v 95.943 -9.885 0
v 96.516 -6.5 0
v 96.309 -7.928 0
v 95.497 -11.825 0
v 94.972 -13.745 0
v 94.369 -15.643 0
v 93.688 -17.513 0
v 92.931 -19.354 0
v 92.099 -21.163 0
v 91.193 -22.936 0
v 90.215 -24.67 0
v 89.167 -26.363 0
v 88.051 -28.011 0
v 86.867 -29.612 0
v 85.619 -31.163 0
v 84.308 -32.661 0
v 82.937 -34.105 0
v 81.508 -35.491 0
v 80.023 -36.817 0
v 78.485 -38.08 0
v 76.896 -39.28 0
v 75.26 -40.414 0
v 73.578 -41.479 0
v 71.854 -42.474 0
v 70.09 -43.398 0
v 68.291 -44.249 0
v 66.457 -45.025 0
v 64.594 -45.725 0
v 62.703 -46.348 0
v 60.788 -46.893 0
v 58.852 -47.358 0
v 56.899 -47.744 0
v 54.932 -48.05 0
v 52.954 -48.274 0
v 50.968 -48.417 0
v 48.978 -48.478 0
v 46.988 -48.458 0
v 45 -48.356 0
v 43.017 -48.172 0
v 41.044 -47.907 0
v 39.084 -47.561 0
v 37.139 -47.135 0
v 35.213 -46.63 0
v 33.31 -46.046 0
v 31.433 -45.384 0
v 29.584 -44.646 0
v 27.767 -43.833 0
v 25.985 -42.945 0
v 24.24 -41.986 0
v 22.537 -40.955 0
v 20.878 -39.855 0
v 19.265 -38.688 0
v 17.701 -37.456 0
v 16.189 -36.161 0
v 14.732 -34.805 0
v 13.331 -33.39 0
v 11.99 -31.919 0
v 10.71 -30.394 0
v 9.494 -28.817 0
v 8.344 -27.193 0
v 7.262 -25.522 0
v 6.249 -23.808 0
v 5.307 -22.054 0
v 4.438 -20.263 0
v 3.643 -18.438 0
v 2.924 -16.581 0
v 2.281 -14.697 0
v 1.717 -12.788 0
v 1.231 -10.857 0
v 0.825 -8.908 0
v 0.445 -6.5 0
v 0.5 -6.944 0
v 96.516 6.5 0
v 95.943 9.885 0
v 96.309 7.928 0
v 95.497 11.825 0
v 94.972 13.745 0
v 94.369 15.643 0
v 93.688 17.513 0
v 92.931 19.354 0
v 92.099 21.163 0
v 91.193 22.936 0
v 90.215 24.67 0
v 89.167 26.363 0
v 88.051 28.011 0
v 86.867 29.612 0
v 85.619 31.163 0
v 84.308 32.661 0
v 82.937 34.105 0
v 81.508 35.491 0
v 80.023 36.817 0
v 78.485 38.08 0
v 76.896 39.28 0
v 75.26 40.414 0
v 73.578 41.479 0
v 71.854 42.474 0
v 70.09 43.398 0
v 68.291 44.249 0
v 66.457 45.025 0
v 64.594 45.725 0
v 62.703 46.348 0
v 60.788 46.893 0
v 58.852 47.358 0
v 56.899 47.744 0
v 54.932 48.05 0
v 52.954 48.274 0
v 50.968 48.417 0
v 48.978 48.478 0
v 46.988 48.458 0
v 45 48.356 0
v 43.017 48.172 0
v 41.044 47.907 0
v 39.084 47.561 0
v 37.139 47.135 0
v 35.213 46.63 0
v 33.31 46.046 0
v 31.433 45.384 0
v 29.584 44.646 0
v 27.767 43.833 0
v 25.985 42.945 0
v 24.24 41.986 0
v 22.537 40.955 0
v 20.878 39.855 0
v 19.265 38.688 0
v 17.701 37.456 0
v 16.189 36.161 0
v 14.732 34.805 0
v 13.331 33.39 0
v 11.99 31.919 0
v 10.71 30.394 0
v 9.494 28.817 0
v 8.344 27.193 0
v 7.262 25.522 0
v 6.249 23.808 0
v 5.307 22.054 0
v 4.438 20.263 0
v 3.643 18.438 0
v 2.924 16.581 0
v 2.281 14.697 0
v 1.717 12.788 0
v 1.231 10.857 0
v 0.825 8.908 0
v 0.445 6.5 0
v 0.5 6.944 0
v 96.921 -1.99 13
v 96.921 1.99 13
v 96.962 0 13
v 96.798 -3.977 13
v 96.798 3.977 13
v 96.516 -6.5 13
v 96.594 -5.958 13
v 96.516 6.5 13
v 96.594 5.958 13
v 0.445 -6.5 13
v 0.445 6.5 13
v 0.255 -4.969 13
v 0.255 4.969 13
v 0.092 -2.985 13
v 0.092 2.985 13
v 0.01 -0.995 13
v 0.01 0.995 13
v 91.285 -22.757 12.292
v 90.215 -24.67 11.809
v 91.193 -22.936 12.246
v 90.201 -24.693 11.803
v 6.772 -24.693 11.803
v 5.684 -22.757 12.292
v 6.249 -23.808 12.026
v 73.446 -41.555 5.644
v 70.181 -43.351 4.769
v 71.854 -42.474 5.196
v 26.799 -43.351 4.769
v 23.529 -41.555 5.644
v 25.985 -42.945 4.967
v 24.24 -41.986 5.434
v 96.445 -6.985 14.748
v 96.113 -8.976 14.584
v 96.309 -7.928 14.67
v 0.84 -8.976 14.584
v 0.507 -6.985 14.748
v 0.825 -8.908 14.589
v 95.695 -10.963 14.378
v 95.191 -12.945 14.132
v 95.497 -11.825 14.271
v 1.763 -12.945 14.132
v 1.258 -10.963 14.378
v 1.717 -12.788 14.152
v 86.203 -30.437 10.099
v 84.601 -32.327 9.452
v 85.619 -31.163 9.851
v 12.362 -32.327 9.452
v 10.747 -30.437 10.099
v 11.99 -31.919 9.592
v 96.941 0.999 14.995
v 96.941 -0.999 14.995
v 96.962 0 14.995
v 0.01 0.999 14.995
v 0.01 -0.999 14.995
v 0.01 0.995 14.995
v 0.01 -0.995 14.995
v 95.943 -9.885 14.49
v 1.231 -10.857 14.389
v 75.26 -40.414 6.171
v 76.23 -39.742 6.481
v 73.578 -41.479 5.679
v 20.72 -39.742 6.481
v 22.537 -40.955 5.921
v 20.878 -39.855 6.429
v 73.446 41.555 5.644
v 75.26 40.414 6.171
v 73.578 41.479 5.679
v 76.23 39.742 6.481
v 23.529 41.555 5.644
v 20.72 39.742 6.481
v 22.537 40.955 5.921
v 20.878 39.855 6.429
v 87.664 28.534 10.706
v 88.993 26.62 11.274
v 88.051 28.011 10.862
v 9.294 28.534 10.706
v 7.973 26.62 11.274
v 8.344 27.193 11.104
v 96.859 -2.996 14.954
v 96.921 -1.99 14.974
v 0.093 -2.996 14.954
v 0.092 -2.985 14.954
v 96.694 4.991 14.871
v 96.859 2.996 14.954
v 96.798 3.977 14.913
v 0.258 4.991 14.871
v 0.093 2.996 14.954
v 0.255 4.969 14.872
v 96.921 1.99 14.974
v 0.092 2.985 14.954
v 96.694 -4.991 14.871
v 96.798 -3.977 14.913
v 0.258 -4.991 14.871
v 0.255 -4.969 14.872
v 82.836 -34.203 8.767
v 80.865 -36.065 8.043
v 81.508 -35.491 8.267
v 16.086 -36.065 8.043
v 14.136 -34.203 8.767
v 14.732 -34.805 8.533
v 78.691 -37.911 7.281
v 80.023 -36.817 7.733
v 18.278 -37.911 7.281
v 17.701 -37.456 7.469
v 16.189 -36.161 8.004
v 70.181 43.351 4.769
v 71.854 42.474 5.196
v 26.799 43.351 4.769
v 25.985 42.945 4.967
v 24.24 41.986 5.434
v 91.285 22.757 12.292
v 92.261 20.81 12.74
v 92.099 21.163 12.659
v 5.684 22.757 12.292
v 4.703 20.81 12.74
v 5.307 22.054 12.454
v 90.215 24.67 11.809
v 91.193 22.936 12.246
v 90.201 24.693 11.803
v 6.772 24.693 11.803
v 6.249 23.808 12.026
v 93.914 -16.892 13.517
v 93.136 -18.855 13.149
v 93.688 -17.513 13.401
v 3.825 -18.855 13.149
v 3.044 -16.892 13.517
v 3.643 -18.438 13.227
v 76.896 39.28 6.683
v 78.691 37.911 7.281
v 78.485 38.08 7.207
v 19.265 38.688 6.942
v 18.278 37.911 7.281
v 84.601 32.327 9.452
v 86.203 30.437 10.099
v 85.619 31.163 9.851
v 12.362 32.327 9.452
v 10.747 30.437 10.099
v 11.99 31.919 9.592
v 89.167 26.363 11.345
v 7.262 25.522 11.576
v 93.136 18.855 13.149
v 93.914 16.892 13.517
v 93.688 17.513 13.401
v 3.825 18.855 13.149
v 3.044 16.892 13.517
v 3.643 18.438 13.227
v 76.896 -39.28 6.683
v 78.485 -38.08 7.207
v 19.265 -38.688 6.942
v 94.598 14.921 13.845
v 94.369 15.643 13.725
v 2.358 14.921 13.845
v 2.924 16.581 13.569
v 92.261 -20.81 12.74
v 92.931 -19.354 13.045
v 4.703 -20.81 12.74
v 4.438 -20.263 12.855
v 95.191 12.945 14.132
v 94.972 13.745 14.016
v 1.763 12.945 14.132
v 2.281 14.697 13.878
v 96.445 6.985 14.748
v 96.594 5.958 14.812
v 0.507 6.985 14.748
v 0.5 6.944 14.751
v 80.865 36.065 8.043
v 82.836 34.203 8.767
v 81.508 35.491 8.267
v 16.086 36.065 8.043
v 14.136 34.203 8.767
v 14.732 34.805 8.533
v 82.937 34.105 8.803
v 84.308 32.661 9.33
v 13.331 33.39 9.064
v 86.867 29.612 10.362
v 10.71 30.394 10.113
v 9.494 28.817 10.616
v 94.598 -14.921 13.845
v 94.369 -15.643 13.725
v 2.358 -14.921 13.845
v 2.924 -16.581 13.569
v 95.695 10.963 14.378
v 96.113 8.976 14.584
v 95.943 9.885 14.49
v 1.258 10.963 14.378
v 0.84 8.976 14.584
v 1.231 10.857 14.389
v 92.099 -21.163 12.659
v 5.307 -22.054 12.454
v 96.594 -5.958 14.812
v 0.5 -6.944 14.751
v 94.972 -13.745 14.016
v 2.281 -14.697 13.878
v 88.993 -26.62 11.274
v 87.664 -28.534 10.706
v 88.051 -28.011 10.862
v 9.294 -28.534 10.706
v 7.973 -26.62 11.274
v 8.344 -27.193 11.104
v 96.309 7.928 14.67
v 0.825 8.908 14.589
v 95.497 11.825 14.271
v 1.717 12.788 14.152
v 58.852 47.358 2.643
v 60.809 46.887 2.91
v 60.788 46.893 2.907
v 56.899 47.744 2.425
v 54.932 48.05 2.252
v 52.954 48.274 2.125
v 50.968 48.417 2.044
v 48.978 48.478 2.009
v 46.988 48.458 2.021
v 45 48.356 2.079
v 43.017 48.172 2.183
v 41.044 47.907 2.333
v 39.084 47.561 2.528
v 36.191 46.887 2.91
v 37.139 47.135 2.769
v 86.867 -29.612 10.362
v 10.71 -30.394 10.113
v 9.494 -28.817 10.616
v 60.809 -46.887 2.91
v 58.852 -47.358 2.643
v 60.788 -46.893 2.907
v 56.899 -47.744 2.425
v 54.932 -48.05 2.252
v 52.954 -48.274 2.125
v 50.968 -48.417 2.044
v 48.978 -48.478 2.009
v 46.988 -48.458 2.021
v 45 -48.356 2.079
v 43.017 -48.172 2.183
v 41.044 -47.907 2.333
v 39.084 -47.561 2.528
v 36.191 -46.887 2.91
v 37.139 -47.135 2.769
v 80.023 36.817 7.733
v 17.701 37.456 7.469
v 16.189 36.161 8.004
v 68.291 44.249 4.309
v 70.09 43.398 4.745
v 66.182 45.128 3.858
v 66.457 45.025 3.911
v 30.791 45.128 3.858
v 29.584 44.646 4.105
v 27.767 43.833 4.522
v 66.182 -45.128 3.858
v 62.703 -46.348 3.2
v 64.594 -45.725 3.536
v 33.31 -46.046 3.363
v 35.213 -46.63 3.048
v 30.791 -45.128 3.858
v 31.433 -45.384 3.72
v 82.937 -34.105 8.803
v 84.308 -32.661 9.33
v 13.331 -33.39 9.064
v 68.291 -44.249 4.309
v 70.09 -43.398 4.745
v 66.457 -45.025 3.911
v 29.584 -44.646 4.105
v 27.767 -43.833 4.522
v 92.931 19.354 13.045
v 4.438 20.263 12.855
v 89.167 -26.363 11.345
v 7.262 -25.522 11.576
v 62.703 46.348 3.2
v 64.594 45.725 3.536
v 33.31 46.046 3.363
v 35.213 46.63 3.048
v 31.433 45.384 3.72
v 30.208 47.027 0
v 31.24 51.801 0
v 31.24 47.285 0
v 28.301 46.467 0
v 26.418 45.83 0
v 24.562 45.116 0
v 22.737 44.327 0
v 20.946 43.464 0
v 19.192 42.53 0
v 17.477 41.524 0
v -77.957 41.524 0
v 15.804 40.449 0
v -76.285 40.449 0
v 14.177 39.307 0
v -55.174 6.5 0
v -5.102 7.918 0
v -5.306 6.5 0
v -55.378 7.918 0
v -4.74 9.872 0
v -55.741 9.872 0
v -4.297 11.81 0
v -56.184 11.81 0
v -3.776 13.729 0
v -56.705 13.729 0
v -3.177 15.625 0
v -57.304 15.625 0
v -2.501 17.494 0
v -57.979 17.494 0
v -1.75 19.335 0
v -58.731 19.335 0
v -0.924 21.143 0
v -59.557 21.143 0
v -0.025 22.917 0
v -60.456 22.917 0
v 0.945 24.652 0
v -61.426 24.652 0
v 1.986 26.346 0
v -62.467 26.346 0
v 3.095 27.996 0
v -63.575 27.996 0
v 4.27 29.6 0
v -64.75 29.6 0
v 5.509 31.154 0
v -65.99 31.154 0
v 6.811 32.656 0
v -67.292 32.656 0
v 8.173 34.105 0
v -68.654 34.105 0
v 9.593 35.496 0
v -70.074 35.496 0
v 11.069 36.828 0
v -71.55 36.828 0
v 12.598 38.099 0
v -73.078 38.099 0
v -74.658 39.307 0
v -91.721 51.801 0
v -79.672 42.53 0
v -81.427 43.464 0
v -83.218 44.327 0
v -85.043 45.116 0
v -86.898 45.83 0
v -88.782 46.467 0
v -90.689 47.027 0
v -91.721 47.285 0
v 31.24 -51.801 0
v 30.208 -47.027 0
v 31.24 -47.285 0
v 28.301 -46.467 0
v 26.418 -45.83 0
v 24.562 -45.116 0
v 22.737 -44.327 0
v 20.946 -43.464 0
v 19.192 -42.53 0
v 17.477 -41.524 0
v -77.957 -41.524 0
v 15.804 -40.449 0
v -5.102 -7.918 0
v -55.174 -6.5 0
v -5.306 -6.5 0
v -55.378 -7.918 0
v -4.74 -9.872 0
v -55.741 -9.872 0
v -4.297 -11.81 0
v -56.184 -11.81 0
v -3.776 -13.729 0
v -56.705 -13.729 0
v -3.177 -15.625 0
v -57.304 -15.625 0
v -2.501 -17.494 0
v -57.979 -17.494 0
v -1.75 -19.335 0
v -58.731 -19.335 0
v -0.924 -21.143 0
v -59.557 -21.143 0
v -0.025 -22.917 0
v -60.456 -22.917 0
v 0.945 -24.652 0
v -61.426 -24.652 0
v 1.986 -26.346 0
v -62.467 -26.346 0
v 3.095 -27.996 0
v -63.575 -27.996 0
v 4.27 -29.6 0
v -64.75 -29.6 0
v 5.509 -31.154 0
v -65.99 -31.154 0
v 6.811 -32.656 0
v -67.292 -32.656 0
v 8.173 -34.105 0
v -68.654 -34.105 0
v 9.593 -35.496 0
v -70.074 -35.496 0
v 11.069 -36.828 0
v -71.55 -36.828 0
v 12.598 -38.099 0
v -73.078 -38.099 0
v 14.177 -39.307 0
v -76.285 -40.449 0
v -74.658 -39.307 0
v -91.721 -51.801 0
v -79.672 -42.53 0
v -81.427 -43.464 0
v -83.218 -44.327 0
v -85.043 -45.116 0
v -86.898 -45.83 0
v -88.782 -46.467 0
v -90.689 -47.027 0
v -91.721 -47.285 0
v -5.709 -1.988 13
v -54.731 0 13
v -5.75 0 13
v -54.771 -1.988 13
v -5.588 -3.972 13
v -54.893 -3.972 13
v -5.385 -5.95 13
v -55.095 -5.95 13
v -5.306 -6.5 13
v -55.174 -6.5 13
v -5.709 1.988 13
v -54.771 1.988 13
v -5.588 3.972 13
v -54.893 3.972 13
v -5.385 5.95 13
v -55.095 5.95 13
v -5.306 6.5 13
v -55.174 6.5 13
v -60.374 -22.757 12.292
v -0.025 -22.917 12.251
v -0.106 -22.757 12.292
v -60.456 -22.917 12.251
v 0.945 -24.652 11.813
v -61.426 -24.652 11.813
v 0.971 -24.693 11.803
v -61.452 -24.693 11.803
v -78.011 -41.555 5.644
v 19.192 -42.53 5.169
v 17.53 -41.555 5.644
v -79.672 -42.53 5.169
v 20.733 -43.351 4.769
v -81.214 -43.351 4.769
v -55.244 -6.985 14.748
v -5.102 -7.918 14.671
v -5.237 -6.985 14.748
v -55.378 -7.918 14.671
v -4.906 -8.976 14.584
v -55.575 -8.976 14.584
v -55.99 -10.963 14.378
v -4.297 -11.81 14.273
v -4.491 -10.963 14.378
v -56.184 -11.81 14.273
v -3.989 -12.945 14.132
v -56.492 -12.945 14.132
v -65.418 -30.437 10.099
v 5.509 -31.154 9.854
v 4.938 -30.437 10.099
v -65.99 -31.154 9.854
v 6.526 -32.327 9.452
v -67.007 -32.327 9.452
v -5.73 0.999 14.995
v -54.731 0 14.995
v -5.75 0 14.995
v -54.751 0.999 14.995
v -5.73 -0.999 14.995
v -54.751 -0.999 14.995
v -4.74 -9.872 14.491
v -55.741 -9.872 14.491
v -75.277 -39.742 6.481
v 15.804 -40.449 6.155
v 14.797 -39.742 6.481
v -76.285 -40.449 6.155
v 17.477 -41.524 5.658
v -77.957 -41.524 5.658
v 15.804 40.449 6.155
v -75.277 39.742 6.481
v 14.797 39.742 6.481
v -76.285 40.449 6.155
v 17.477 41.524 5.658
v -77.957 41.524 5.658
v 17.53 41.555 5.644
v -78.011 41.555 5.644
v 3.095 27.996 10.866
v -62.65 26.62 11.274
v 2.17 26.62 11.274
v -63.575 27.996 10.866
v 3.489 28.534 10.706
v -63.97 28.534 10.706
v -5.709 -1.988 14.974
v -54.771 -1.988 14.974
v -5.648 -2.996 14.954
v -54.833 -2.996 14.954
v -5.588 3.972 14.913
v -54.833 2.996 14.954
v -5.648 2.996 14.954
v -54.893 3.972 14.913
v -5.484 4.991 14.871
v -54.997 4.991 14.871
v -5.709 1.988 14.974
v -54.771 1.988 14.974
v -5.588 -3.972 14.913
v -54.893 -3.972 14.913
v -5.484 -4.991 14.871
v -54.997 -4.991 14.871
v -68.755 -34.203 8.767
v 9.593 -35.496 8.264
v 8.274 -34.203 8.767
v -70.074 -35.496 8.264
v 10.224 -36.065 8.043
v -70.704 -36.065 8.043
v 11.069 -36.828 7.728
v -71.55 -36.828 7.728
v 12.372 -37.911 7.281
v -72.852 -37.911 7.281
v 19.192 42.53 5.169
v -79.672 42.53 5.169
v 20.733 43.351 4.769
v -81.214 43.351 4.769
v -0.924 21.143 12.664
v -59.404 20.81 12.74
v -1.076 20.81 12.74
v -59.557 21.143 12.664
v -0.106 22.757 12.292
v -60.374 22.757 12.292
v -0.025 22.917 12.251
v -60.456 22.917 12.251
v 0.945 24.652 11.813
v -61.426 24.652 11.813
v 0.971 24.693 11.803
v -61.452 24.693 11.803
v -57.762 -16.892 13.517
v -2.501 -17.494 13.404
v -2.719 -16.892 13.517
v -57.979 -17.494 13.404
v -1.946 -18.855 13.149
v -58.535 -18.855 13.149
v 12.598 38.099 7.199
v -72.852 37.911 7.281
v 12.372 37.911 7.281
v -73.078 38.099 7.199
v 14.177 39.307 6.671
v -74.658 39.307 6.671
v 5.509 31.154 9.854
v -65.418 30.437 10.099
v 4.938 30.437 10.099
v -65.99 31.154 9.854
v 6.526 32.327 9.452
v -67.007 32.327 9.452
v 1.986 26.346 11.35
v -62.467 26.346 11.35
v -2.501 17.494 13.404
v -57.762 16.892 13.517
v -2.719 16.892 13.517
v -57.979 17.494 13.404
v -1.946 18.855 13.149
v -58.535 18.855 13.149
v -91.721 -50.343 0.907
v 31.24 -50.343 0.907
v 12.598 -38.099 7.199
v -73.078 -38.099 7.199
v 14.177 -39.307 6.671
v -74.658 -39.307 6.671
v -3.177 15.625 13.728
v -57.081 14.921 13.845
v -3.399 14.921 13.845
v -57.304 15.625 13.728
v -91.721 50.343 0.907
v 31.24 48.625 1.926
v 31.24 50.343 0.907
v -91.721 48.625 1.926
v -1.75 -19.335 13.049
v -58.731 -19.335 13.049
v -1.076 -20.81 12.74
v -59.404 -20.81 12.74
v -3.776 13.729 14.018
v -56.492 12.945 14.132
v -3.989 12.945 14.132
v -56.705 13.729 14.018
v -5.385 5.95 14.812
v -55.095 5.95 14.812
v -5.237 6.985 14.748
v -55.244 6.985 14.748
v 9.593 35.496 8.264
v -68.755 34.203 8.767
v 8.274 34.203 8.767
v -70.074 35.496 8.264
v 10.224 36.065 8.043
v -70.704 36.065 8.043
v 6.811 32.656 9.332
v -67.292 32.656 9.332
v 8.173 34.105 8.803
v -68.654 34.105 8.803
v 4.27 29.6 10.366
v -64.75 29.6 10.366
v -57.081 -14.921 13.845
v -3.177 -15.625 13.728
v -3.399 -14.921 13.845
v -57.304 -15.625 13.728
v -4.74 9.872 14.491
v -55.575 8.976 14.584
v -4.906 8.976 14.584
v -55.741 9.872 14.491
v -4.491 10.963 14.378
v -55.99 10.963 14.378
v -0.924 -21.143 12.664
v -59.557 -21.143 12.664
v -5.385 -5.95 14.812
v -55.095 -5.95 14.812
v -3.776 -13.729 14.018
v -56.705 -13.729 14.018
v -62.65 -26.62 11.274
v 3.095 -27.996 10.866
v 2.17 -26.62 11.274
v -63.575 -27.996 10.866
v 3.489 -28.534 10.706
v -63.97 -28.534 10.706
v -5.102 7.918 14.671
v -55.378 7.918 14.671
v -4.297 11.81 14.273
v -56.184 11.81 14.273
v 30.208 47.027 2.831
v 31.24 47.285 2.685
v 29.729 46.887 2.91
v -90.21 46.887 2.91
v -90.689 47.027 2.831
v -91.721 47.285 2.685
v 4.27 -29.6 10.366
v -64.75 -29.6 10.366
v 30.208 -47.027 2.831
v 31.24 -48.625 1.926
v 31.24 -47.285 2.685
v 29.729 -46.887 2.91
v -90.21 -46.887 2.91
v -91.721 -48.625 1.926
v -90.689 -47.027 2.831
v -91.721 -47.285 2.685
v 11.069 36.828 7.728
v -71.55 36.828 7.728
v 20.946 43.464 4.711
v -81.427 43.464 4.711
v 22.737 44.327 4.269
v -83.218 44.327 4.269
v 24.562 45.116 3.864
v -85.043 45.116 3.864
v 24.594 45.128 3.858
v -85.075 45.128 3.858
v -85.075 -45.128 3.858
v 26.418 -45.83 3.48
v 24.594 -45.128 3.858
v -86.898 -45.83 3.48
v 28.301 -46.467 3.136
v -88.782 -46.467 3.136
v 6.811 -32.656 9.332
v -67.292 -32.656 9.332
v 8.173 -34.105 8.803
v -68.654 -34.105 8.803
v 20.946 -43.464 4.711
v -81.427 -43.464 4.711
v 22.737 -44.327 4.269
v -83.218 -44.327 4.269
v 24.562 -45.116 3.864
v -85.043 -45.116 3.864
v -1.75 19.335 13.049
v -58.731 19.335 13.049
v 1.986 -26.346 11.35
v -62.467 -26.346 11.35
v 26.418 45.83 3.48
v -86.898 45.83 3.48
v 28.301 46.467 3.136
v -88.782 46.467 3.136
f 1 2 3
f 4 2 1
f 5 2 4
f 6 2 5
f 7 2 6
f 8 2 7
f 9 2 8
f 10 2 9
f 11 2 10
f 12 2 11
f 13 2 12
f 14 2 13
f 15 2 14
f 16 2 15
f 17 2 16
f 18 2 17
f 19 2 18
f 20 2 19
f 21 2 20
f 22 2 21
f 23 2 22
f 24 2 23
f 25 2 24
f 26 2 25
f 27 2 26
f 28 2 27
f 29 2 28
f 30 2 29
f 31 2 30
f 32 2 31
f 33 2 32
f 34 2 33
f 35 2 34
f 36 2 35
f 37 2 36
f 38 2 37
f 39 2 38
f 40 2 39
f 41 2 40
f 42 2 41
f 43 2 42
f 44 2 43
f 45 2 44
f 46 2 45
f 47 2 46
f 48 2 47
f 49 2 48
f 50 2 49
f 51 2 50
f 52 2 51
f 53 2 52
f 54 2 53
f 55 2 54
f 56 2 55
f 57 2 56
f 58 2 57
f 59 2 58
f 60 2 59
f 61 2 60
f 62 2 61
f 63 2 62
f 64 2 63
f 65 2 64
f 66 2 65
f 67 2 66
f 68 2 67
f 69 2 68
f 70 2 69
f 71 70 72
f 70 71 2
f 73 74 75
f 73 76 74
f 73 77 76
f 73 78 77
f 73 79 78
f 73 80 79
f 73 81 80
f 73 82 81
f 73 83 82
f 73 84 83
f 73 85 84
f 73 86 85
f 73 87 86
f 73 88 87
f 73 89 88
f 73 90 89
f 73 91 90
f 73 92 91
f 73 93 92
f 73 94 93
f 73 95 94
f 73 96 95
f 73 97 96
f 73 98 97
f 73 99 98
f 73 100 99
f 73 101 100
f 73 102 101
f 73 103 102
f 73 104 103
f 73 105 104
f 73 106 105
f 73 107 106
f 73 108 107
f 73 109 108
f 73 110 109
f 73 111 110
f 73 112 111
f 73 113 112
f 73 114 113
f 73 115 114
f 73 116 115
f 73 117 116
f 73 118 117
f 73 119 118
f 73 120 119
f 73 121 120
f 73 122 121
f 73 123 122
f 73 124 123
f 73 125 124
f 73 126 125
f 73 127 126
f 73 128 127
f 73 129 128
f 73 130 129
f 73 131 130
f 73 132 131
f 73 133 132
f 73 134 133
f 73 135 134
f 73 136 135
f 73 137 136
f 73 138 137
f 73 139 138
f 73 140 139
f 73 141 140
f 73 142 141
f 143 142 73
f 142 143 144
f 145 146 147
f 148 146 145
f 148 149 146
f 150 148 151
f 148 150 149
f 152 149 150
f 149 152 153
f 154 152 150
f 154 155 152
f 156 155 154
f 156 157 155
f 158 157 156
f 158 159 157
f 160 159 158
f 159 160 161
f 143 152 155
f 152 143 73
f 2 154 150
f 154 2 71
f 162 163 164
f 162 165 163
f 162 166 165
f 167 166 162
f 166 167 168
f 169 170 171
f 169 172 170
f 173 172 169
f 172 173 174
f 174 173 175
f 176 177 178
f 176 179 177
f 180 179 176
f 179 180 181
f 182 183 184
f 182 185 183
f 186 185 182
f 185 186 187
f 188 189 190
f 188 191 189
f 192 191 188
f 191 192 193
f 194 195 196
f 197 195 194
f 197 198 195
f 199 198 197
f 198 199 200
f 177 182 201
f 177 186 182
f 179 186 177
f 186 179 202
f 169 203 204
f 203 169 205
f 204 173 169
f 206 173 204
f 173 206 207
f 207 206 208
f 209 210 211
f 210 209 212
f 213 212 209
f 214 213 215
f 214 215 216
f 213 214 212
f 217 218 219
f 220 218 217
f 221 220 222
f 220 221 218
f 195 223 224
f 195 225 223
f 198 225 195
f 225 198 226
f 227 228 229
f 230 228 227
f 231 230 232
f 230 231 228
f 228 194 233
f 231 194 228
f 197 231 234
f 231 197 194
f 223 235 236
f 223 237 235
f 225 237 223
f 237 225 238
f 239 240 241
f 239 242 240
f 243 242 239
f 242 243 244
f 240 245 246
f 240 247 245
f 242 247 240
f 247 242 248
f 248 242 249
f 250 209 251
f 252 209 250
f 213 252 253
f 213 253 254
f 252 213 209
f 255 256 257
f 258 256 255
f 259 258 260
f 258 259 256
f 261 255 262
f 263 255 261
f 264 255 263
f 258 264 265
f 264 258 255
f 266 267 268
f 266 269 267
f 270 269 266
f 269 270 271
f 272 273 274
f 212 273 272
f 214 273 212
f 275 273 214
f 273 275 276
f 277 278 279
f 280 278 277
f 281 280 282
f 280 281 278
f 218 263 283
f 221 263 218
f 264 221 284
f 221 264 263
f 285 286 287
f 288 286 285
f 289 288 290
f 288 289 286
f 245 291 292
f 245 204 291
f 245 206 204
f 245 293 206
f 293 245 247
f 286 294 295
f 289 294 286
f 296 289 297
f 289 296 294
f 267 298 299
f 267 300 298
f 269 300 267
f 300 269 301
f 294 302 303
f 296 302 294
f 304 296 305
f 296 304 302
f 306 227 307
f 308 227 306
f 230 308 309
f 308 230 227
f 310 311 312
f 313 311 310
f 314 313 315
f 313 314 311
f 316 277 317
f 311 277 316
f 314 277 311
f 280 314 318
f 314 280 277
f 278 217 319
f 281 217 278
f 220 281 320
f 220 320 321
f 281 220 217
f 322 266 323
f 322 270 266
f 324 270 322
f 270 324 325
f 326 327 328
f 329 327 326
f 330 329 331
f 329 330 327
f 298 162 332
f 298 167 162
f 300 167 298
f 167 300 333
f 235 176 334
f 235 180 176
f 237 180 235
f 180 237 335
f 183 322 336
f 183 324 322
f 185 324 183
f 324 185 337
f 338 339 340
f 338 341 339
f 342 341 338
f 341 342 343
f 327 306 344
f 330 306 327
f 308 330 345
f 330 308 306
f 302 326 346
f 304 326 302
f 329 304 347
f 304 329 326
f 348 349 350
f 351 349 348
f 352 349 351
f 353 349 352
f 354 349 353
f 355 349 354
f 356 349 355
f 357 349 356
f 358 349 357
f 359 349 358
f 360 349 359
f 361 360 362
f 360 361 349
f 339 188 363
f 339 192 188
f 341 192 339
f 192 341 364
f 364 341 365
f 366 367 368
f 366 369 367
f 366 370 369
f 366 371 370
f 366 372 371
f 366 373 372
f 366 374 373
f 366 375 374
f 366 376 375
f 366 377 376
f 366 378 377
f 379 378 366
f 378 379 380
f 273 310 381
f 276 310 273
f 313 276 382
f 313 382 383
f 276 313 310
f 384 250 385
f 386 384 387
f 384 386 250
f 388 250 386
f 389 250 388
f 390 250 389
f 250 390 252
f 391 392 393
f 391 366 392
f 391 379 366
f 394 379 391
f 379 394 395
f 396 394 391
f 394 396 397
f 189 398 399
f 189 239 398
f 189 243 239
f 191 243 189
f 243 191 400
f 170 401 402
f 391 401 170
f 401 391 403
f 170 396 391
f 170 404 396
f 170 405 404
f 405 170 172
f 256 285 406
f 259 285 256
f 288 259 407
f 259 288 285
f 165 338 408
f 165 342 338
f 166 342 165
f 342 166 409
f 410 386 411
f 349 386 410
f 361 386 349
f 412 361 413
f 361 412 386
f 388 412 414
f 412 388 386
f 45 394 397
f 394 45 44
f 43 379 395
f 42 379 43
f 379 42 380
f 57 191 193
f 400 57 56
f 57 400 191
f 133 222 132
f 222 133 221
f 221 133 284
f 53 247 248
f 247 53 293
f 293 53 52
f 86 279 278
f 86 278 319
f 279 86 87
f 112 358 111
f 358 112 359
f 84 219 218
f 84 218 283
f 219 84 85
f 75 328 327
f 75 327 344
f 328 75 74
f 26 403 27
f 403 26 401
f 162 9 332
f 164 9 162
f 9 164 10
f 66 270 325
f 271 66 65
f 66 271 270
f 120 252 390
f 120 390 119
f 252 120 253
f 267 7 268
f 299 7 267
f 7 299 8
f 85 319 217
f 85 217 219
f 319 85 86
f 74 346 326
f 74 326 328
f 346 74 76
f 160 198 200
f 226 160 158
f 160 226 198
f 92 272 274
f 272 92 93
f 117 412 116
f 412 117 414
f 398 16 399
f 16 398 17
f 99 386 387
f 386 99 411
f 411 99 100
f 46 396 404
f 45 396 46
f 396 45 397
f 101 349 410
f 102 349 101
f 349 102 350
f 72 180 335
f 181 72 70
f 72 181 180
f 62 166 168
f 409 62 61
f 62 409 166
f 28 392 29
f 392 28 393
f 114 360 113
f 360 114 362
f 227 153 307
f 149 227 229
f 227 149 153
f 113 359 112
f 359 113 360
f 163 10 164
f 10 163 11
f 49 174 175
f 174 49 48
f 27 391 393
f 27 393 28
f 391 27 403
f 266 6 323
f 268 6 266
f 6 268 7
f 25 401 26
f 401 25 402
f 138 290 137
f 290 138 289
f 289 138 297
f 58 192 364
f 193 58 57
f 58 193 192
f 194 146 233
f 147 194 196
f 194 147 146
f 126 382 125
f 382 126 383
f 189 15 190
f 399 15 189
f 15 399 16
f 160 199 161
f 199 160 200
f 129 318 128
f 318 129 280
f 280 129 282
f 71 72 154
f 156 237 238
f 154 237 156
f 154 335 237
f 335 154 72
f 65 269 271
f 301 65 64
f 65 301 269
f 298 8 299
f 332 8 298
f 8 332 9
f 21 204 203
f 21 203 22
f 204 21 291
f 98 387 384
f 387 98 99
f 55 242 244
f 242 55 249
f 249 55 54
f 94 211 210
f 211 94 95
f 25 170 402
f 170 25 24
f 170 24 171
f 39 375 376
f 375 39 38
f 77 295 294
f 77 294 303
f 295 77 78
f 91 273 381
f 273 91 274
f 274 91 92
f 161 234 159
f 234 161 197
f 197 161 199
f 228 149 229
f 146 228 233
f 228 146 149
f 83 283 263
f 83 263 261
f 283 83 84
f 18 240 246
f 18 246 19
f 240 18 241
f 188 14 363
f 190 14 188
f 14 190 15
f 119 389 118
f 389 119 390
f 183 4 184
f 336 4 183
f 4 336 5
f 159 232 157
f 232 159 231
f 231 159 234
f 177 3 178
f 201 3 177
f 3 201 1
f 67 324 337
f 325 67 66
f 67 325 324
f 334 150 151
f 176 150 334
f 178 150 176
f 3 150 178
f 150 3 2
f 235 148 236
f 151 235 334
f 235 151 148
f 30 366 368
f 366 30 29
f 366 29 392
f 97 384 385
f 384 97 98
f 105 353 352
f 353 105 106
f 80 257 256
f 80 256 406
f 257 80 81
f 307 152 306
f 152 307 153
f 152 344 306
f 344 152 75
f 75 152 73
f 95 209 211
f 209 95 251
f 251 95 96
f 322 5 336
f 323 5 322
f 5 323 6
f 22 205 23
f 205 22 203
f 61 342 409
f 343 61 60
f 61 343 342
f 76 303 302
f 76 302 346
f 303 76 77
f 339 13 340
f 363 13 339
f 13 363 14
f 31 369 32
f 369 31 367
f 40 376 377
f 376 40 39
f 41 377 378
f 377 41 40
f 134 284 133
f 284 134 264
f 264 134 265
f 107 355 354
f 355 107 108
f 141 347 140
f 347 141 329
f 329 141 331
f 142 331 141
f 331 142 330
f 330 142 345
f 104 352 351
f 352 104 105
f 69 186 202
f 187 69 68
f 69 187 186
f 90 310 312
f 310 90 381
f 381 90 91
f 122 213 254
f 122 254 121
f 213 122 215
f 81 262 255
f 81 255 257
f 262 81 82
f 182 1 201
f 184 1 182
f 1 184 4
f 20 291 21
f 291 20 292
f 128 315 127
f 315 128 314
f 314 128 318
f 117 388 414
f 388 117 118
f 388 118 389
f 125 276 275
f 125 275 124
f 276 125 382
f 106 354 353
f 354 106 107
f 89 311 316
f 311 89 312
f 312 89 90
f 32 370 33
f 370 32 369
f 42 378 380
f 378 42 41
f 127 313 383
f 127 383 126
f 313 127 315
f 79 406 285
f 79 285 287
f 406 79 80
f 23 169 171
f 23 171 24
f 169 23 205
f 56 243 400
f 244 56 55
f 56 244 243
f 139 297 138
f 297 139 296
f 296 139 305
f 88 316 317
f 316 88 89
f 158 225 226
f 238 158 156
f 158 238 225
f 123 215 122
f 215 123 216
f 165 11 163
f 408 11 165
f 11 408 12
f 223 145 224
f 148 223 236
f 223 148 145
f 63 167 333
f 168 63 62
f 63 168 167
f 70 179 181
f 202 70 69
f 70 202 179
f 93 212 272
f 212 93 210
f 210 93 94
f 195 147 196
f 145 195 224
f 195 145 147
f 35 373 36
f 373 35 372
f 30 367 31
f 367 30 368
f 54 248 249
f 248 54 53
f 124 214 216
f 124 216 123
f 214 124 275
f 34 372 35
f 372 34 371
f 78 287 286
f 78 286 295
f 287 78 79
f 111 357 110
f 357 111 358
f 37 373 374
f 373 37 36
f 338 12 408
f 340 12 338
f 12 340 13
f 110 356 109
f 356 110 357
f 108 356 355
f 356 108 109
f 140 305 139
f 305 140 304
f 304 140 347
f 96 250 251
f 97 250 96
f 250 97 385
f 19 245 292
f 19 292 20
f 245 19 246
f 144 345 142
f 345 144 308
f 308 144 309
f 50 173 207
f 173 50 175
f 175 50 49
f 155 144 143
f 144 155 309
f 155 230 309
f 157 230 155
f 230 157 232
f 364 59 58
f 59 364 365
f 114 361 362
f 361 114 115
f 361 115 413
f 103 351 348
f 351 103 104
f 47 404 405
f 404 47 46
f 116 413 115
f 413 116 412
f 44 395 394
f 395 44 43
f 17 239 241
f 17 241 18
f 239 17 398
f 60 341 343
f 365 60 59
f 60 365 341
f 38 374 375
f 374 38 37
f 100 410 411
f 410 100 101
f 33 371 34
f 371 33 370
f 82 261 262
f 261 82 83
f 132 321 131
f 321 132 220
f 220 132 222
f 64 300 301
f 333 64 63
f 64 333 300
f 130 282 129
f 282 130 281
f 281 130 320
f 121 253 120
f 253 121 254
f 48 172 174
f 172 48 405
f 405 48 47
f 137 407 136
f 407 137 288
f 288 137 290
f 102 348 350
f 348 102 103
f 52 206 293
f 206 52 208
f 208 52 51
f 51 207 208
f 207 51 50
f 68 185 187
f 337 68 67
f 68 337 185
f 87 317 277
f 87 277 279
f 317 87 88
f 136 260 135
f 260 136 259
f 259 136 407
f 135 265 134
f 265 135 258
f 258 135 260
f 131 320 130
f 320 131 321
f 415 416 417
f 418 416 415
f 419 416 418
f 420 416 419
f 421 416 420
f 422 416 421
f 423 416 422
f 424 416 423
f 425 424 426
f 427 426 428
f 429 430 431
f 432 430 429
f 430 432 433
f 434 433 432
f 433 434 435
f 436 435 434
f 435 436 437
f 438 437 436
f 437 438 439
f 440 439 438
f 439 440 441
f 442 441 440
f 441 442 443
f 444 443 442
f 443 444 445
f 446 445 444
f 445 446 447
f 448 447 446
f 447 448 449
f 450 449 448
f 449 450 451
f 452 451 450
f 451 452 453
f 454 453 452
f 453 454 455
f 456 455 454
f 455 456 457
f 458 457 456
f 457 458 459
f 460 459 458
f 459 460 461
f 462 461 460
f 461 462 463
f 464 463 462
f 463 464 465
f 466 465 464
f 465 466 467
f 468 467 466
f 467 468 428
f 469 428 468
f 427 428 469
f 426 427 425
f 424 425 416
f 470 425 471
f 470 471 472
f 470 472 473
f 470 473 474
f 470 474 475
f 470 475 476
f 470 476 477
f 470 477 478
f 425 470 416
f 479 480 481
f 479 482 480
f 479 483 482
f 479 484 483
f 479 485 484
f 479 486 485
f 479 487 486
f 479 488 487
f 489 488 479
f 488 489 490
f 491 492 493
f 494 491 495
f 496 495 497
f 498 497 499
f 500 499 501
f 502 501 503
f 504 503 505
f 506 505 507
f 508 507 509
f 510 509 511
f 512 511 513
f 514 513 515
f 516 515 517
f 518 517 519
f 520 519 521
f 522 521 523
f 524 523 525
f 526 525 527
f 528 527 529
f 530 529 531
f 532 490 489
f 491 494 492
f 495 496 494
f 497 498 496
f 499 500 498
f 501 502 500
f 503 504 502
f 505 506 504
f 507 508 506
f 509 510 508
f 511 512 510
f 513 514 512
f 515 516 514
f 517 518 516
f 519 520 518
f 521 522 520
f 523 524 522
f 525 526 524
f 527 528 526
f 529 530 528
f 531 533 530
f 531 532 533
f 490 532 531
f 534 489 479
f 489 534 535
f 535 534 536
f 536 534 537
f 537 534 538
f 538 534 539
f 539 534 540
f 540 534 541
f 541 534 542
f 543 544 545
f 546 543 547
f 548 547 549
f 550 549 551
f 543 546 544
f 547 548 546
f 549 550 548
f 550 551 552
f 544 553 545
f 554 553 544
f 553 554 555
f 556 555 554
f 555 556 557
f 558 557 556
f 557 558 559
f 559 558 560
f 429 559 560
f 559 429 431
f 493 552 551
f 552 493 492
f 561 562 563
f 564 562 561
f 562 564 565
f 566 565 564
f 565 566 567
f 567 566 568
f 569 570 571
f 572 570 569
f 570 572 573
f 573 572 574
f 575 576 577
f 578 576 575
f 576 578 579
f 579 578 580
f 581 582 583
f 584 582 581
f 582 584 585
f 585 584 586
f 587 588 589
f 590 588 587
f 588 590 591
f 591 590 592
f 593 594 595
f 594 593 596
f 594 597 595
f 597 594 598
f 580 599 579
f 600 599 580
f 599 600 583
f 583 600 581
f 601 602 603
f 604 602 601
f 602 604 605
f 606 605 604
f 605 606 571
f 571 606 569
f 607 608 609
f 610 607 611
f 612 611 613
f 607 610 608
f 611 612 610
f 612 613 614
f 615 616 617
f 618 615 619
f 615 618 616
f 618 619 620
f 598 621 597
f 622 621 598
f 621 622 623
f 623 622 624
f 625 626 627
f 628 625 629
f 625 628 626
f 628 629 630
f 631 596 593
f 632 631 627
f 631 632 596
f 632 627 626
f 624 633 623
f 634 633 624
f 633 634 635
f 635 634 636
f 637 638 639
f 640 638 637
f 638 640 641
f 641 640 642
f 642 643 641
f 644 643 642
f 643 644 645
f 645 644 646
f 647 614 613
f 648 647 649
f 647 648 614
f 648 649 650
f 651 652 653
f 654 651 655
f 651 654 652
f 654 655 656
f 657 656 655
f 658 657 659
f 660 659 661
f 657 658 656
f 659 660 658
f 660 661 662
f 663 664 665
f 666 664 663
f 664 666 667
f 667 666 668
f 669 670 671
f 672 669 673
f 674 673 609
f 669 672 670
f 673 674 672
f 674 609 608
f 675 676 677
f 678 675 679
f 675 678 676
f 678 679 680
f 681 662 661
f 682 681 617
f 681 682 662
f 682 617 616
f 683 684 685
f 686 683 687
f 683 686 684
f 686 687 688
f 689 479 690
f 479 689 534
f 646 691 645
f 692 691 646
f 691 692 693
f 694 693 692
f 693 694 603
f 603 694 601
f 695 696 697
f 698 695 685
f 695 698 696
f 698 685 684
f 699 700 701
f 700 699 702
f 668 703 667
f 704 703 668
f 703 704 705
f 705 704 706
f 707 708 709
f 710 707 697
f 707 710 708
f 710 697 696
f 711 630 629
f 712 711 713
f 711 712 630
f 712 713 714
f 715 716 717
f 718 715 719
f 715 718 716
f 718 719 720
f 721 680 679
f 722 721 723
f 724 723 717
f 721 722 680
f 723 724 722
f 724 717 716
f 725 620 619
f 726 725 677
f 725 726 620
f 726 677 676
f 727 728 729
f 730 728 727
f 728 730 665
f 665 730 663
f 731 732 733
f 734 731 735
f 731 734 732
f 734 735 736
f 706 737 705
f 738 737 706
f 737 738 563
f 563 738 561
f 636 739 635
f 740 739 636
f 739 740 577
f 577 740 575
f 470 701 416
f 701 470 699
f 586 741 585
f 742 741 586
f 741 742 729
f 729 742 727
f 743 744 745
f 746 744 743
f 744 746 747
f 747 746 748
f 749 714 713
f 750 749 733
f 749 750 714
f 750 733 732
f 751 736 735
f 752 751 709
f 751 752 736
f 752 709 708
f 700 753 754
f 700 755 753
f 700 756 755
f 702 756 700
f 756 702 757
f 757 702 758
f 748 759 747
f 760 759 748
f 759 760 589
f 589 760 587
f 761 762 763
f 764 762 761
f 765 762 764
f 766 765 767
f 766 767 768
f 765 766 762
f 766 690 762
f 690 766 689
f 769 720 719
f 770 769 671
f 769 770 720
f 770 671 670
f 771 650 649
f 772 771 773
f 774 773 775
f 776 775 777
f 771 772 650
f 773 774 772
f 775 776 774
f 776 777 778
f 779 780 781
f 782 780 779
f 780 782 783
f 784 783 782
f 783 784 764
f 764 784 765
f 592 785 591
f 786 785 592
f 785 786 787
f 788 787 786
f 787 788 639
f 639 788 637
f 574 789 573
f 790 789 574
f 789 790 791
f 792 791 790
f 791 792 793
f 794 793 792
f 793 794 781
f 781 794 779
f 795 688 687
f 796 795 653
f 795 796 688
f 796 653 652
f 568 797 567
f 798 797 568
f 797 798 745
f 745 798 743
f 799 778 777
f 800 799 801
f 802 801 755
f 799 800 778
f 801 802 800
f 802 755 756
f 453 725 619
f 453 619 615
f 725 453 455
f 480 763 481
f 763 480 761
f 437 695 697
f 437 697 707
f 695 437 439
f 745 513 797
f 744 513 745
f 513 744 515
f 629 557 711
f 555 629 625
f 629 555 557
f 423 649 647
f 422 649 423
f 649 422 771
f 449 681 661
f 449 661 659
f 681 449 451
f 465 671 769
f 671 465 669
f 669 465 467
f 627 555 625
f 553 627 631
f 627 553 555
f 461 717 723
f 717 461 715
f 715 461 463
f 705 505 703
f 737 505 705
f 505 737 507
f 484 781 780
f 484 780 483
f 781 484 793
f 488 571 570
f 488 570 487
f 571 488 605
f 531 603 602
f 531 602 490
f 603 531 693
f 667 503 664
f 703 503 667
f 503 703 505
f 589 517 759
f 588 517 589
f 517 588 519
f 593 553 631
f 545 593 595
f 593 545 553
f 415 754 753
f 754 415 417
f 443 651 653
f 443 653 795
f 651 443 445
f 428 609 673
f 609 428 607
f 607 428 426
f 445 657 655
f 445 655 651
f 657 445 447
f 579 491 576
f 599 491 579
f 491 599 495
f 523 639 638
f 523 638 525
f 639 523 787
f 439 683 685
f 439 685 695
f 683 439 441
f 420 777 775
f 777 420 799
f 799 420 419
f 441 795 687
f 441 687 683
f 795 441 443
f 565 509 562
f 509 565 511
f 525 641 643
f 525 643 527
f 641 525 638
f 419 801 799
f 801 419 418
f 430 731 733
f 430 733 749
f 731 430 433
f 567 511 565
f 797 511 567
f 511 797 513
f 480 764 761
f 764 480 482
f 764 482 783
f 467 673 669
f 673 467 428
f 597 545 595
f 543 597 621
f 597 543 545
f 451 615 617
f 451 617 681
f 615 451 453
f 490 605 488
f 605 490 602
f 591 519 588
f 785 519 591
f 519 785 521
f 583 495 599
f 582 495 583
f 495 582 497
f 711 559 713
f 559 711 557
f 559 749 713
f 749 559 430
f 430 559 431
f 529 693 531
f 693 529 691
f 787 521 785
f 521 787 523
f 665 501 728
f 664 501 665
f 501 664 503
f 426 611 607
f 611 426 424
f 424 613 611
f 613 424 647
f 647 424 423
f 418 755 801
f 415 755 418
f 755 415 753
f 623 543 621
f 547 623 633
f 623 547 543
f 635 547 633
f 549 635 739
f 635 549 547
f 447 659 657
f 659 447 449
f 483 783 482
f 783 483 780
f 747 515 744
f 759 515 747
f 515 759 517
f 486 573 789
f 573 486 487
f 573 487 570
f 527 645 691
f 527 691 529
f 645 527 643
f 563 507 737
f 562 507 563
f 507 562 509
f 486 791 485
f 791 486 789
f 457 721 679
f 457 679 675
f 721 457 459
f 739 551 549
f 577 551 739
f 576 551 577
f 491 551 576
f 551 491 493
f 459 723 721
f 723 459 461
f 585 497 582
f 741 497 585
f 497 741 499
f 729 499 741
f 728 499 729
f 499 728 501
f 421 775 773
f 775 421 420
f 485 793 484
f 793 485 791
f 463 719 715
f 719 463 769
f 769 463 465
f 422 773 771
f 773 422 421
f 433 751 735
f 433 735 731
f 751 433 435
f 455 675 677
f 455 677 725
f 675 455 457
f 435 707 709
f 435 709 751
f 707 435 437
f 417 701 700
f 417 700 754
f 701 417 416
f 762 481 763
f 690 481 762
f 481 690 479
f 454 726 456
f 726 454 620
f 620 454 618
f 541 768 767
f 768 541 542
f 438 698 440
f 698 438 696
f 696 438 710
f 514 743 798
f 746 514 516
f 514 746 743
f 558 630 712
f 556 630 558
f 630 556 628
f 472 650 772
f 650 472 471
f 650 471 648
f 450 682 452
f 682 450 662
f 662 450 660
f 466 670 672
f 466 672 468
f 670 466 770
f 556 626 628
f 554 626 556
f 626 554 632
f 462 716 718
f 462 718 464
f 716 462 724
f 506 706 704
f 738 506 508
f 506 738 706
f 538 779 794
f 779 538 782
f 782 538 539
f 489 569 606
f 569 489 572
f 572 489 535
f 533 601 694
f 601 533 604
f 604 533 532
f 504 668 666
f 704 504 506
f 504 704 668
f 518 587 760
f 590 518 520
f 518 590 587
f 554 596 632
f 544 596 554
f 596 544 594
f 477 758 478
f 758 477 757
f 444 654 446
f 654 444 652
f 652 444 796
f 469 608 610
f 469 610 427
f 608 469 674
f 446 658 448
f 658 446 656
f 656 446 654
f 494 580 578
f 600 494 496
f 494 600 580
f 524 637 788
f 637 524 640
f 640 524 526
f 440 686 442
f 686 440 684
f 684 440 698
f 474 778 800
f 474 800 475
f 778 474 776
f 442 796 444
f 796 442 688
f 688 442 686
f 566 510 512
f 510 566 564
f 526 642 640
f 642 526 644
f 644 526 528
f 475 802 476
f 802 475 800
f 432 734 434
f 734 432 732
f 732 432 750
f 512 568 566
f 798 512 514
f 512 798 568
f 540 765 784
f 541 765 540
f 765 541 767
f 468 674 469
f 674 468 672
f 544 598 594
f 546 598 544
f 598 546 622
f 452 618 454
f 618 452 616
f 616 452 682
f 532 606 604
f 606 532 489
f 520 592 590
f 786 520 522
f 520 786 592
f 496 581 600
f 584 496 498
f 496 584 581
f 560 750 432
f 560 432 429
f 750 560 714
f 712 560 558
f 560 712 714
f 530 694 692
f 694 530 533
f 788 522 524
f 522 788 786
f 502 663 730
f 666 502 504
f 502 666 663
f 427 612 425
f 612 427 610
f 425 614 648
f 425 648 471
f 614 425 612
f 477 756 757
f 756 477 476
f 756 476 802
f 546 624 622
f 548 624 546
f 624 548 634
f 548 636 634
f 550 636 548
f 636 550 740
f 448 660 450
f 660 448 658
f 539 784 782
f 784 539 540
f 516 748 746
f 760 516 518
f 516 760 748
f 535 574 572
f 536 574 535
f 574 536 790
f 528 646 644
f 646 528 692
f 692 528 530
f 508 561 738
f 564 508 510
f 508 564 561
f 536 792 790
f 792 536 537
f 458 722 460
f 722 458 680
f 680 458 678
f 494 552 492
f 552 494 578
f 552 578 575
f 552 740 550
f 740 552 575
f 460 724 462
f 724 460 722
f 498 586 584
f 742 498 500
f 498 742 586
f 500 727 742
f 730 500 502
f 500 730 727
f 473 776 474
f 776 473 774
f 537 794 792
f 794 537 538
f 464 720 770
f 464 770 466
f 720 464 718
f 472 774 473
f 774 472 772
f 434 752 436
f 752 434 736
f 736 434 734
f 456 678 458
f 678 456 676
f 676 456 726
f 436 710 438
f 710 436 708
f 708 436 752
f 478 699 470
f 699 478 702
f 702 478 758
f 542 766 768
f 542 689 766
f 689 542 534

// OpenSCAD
// "Linkable" Floor Cable Protector
// variables for channel height and width.
// ADA compliance requires steepest approach to be 12 deg.  This determines width.

// Angle of attack, ADA requires steepest approach to be 12 degrees.  Also determines width.
AA=30; //[10,12,15,20,25,30]
// Height of channel, helps determine external height and width of chain
channel_height= 13; // [1:50]
// Width of channel, use narrower than a maximum (as determined by channel_height)
channel_width= 13; // [1:50]
// Thickness of bridge
bridge=2; //[1:5]
// Tolerance for mating parts
tolx=0.25; // [0:0.1:3]
// Which parts to print?
part = "both"; // [first:disk,second:linker,both:both]

print_part();

module print_part() {
	if (part == "first") {
		circle();
	} else if (part == "second") {
		link();
	} else if (part == "both") {
		both();
	} else {
		both();
	}
}

$fa=1;

// Perform cylinder calculations
cyl_rad=((channel_height+bridge)*cos(AA))/(1-cos(AA));
overlook=cyl_rad*sin(AA);

module track(){
    difference(){
        translate([0,0,-(cyl_rad-channel_height-bridge)])rotate([0,90,0])cylinder(h=overlook*2,r=cyl_rad);
        union(){
            translate([-tolx,-cyl_rad,-2*cyl_rad])cube([2*overlook+2*tolx,2*cyl_rad+tolx,2*cyl_rad]);
            translate([-tolx,-channel_width/2,-tolx])cube([2*overlook+2*tolx,channel_width,channel_height+tolx]);
        }
    }
}

module circle(){
    intersection(){
        track();
        translate([overlook,0,-tolx])cylinder(h=overlook,r=overlook);
   }
}

module cup(){
    difference(){
        track();
        union(){
            translate([1.5*overlook+2*tolx,0,-tolx])cylinder(h=overlook,r=overlook+tolx);
            translate([1*overlook+channel_width,-overlook-channel_width,-tolx])cube([2*(overlook+channel_width),2*(overlook+channel_width),overlook]);
        }
    }
}

module link(){
    translate([-overlook/2-3*bridge,0,0]) union(){
        cup();
        mirror([1,0,0])cup();}
}

module both(){
    circle();
    link();
}
